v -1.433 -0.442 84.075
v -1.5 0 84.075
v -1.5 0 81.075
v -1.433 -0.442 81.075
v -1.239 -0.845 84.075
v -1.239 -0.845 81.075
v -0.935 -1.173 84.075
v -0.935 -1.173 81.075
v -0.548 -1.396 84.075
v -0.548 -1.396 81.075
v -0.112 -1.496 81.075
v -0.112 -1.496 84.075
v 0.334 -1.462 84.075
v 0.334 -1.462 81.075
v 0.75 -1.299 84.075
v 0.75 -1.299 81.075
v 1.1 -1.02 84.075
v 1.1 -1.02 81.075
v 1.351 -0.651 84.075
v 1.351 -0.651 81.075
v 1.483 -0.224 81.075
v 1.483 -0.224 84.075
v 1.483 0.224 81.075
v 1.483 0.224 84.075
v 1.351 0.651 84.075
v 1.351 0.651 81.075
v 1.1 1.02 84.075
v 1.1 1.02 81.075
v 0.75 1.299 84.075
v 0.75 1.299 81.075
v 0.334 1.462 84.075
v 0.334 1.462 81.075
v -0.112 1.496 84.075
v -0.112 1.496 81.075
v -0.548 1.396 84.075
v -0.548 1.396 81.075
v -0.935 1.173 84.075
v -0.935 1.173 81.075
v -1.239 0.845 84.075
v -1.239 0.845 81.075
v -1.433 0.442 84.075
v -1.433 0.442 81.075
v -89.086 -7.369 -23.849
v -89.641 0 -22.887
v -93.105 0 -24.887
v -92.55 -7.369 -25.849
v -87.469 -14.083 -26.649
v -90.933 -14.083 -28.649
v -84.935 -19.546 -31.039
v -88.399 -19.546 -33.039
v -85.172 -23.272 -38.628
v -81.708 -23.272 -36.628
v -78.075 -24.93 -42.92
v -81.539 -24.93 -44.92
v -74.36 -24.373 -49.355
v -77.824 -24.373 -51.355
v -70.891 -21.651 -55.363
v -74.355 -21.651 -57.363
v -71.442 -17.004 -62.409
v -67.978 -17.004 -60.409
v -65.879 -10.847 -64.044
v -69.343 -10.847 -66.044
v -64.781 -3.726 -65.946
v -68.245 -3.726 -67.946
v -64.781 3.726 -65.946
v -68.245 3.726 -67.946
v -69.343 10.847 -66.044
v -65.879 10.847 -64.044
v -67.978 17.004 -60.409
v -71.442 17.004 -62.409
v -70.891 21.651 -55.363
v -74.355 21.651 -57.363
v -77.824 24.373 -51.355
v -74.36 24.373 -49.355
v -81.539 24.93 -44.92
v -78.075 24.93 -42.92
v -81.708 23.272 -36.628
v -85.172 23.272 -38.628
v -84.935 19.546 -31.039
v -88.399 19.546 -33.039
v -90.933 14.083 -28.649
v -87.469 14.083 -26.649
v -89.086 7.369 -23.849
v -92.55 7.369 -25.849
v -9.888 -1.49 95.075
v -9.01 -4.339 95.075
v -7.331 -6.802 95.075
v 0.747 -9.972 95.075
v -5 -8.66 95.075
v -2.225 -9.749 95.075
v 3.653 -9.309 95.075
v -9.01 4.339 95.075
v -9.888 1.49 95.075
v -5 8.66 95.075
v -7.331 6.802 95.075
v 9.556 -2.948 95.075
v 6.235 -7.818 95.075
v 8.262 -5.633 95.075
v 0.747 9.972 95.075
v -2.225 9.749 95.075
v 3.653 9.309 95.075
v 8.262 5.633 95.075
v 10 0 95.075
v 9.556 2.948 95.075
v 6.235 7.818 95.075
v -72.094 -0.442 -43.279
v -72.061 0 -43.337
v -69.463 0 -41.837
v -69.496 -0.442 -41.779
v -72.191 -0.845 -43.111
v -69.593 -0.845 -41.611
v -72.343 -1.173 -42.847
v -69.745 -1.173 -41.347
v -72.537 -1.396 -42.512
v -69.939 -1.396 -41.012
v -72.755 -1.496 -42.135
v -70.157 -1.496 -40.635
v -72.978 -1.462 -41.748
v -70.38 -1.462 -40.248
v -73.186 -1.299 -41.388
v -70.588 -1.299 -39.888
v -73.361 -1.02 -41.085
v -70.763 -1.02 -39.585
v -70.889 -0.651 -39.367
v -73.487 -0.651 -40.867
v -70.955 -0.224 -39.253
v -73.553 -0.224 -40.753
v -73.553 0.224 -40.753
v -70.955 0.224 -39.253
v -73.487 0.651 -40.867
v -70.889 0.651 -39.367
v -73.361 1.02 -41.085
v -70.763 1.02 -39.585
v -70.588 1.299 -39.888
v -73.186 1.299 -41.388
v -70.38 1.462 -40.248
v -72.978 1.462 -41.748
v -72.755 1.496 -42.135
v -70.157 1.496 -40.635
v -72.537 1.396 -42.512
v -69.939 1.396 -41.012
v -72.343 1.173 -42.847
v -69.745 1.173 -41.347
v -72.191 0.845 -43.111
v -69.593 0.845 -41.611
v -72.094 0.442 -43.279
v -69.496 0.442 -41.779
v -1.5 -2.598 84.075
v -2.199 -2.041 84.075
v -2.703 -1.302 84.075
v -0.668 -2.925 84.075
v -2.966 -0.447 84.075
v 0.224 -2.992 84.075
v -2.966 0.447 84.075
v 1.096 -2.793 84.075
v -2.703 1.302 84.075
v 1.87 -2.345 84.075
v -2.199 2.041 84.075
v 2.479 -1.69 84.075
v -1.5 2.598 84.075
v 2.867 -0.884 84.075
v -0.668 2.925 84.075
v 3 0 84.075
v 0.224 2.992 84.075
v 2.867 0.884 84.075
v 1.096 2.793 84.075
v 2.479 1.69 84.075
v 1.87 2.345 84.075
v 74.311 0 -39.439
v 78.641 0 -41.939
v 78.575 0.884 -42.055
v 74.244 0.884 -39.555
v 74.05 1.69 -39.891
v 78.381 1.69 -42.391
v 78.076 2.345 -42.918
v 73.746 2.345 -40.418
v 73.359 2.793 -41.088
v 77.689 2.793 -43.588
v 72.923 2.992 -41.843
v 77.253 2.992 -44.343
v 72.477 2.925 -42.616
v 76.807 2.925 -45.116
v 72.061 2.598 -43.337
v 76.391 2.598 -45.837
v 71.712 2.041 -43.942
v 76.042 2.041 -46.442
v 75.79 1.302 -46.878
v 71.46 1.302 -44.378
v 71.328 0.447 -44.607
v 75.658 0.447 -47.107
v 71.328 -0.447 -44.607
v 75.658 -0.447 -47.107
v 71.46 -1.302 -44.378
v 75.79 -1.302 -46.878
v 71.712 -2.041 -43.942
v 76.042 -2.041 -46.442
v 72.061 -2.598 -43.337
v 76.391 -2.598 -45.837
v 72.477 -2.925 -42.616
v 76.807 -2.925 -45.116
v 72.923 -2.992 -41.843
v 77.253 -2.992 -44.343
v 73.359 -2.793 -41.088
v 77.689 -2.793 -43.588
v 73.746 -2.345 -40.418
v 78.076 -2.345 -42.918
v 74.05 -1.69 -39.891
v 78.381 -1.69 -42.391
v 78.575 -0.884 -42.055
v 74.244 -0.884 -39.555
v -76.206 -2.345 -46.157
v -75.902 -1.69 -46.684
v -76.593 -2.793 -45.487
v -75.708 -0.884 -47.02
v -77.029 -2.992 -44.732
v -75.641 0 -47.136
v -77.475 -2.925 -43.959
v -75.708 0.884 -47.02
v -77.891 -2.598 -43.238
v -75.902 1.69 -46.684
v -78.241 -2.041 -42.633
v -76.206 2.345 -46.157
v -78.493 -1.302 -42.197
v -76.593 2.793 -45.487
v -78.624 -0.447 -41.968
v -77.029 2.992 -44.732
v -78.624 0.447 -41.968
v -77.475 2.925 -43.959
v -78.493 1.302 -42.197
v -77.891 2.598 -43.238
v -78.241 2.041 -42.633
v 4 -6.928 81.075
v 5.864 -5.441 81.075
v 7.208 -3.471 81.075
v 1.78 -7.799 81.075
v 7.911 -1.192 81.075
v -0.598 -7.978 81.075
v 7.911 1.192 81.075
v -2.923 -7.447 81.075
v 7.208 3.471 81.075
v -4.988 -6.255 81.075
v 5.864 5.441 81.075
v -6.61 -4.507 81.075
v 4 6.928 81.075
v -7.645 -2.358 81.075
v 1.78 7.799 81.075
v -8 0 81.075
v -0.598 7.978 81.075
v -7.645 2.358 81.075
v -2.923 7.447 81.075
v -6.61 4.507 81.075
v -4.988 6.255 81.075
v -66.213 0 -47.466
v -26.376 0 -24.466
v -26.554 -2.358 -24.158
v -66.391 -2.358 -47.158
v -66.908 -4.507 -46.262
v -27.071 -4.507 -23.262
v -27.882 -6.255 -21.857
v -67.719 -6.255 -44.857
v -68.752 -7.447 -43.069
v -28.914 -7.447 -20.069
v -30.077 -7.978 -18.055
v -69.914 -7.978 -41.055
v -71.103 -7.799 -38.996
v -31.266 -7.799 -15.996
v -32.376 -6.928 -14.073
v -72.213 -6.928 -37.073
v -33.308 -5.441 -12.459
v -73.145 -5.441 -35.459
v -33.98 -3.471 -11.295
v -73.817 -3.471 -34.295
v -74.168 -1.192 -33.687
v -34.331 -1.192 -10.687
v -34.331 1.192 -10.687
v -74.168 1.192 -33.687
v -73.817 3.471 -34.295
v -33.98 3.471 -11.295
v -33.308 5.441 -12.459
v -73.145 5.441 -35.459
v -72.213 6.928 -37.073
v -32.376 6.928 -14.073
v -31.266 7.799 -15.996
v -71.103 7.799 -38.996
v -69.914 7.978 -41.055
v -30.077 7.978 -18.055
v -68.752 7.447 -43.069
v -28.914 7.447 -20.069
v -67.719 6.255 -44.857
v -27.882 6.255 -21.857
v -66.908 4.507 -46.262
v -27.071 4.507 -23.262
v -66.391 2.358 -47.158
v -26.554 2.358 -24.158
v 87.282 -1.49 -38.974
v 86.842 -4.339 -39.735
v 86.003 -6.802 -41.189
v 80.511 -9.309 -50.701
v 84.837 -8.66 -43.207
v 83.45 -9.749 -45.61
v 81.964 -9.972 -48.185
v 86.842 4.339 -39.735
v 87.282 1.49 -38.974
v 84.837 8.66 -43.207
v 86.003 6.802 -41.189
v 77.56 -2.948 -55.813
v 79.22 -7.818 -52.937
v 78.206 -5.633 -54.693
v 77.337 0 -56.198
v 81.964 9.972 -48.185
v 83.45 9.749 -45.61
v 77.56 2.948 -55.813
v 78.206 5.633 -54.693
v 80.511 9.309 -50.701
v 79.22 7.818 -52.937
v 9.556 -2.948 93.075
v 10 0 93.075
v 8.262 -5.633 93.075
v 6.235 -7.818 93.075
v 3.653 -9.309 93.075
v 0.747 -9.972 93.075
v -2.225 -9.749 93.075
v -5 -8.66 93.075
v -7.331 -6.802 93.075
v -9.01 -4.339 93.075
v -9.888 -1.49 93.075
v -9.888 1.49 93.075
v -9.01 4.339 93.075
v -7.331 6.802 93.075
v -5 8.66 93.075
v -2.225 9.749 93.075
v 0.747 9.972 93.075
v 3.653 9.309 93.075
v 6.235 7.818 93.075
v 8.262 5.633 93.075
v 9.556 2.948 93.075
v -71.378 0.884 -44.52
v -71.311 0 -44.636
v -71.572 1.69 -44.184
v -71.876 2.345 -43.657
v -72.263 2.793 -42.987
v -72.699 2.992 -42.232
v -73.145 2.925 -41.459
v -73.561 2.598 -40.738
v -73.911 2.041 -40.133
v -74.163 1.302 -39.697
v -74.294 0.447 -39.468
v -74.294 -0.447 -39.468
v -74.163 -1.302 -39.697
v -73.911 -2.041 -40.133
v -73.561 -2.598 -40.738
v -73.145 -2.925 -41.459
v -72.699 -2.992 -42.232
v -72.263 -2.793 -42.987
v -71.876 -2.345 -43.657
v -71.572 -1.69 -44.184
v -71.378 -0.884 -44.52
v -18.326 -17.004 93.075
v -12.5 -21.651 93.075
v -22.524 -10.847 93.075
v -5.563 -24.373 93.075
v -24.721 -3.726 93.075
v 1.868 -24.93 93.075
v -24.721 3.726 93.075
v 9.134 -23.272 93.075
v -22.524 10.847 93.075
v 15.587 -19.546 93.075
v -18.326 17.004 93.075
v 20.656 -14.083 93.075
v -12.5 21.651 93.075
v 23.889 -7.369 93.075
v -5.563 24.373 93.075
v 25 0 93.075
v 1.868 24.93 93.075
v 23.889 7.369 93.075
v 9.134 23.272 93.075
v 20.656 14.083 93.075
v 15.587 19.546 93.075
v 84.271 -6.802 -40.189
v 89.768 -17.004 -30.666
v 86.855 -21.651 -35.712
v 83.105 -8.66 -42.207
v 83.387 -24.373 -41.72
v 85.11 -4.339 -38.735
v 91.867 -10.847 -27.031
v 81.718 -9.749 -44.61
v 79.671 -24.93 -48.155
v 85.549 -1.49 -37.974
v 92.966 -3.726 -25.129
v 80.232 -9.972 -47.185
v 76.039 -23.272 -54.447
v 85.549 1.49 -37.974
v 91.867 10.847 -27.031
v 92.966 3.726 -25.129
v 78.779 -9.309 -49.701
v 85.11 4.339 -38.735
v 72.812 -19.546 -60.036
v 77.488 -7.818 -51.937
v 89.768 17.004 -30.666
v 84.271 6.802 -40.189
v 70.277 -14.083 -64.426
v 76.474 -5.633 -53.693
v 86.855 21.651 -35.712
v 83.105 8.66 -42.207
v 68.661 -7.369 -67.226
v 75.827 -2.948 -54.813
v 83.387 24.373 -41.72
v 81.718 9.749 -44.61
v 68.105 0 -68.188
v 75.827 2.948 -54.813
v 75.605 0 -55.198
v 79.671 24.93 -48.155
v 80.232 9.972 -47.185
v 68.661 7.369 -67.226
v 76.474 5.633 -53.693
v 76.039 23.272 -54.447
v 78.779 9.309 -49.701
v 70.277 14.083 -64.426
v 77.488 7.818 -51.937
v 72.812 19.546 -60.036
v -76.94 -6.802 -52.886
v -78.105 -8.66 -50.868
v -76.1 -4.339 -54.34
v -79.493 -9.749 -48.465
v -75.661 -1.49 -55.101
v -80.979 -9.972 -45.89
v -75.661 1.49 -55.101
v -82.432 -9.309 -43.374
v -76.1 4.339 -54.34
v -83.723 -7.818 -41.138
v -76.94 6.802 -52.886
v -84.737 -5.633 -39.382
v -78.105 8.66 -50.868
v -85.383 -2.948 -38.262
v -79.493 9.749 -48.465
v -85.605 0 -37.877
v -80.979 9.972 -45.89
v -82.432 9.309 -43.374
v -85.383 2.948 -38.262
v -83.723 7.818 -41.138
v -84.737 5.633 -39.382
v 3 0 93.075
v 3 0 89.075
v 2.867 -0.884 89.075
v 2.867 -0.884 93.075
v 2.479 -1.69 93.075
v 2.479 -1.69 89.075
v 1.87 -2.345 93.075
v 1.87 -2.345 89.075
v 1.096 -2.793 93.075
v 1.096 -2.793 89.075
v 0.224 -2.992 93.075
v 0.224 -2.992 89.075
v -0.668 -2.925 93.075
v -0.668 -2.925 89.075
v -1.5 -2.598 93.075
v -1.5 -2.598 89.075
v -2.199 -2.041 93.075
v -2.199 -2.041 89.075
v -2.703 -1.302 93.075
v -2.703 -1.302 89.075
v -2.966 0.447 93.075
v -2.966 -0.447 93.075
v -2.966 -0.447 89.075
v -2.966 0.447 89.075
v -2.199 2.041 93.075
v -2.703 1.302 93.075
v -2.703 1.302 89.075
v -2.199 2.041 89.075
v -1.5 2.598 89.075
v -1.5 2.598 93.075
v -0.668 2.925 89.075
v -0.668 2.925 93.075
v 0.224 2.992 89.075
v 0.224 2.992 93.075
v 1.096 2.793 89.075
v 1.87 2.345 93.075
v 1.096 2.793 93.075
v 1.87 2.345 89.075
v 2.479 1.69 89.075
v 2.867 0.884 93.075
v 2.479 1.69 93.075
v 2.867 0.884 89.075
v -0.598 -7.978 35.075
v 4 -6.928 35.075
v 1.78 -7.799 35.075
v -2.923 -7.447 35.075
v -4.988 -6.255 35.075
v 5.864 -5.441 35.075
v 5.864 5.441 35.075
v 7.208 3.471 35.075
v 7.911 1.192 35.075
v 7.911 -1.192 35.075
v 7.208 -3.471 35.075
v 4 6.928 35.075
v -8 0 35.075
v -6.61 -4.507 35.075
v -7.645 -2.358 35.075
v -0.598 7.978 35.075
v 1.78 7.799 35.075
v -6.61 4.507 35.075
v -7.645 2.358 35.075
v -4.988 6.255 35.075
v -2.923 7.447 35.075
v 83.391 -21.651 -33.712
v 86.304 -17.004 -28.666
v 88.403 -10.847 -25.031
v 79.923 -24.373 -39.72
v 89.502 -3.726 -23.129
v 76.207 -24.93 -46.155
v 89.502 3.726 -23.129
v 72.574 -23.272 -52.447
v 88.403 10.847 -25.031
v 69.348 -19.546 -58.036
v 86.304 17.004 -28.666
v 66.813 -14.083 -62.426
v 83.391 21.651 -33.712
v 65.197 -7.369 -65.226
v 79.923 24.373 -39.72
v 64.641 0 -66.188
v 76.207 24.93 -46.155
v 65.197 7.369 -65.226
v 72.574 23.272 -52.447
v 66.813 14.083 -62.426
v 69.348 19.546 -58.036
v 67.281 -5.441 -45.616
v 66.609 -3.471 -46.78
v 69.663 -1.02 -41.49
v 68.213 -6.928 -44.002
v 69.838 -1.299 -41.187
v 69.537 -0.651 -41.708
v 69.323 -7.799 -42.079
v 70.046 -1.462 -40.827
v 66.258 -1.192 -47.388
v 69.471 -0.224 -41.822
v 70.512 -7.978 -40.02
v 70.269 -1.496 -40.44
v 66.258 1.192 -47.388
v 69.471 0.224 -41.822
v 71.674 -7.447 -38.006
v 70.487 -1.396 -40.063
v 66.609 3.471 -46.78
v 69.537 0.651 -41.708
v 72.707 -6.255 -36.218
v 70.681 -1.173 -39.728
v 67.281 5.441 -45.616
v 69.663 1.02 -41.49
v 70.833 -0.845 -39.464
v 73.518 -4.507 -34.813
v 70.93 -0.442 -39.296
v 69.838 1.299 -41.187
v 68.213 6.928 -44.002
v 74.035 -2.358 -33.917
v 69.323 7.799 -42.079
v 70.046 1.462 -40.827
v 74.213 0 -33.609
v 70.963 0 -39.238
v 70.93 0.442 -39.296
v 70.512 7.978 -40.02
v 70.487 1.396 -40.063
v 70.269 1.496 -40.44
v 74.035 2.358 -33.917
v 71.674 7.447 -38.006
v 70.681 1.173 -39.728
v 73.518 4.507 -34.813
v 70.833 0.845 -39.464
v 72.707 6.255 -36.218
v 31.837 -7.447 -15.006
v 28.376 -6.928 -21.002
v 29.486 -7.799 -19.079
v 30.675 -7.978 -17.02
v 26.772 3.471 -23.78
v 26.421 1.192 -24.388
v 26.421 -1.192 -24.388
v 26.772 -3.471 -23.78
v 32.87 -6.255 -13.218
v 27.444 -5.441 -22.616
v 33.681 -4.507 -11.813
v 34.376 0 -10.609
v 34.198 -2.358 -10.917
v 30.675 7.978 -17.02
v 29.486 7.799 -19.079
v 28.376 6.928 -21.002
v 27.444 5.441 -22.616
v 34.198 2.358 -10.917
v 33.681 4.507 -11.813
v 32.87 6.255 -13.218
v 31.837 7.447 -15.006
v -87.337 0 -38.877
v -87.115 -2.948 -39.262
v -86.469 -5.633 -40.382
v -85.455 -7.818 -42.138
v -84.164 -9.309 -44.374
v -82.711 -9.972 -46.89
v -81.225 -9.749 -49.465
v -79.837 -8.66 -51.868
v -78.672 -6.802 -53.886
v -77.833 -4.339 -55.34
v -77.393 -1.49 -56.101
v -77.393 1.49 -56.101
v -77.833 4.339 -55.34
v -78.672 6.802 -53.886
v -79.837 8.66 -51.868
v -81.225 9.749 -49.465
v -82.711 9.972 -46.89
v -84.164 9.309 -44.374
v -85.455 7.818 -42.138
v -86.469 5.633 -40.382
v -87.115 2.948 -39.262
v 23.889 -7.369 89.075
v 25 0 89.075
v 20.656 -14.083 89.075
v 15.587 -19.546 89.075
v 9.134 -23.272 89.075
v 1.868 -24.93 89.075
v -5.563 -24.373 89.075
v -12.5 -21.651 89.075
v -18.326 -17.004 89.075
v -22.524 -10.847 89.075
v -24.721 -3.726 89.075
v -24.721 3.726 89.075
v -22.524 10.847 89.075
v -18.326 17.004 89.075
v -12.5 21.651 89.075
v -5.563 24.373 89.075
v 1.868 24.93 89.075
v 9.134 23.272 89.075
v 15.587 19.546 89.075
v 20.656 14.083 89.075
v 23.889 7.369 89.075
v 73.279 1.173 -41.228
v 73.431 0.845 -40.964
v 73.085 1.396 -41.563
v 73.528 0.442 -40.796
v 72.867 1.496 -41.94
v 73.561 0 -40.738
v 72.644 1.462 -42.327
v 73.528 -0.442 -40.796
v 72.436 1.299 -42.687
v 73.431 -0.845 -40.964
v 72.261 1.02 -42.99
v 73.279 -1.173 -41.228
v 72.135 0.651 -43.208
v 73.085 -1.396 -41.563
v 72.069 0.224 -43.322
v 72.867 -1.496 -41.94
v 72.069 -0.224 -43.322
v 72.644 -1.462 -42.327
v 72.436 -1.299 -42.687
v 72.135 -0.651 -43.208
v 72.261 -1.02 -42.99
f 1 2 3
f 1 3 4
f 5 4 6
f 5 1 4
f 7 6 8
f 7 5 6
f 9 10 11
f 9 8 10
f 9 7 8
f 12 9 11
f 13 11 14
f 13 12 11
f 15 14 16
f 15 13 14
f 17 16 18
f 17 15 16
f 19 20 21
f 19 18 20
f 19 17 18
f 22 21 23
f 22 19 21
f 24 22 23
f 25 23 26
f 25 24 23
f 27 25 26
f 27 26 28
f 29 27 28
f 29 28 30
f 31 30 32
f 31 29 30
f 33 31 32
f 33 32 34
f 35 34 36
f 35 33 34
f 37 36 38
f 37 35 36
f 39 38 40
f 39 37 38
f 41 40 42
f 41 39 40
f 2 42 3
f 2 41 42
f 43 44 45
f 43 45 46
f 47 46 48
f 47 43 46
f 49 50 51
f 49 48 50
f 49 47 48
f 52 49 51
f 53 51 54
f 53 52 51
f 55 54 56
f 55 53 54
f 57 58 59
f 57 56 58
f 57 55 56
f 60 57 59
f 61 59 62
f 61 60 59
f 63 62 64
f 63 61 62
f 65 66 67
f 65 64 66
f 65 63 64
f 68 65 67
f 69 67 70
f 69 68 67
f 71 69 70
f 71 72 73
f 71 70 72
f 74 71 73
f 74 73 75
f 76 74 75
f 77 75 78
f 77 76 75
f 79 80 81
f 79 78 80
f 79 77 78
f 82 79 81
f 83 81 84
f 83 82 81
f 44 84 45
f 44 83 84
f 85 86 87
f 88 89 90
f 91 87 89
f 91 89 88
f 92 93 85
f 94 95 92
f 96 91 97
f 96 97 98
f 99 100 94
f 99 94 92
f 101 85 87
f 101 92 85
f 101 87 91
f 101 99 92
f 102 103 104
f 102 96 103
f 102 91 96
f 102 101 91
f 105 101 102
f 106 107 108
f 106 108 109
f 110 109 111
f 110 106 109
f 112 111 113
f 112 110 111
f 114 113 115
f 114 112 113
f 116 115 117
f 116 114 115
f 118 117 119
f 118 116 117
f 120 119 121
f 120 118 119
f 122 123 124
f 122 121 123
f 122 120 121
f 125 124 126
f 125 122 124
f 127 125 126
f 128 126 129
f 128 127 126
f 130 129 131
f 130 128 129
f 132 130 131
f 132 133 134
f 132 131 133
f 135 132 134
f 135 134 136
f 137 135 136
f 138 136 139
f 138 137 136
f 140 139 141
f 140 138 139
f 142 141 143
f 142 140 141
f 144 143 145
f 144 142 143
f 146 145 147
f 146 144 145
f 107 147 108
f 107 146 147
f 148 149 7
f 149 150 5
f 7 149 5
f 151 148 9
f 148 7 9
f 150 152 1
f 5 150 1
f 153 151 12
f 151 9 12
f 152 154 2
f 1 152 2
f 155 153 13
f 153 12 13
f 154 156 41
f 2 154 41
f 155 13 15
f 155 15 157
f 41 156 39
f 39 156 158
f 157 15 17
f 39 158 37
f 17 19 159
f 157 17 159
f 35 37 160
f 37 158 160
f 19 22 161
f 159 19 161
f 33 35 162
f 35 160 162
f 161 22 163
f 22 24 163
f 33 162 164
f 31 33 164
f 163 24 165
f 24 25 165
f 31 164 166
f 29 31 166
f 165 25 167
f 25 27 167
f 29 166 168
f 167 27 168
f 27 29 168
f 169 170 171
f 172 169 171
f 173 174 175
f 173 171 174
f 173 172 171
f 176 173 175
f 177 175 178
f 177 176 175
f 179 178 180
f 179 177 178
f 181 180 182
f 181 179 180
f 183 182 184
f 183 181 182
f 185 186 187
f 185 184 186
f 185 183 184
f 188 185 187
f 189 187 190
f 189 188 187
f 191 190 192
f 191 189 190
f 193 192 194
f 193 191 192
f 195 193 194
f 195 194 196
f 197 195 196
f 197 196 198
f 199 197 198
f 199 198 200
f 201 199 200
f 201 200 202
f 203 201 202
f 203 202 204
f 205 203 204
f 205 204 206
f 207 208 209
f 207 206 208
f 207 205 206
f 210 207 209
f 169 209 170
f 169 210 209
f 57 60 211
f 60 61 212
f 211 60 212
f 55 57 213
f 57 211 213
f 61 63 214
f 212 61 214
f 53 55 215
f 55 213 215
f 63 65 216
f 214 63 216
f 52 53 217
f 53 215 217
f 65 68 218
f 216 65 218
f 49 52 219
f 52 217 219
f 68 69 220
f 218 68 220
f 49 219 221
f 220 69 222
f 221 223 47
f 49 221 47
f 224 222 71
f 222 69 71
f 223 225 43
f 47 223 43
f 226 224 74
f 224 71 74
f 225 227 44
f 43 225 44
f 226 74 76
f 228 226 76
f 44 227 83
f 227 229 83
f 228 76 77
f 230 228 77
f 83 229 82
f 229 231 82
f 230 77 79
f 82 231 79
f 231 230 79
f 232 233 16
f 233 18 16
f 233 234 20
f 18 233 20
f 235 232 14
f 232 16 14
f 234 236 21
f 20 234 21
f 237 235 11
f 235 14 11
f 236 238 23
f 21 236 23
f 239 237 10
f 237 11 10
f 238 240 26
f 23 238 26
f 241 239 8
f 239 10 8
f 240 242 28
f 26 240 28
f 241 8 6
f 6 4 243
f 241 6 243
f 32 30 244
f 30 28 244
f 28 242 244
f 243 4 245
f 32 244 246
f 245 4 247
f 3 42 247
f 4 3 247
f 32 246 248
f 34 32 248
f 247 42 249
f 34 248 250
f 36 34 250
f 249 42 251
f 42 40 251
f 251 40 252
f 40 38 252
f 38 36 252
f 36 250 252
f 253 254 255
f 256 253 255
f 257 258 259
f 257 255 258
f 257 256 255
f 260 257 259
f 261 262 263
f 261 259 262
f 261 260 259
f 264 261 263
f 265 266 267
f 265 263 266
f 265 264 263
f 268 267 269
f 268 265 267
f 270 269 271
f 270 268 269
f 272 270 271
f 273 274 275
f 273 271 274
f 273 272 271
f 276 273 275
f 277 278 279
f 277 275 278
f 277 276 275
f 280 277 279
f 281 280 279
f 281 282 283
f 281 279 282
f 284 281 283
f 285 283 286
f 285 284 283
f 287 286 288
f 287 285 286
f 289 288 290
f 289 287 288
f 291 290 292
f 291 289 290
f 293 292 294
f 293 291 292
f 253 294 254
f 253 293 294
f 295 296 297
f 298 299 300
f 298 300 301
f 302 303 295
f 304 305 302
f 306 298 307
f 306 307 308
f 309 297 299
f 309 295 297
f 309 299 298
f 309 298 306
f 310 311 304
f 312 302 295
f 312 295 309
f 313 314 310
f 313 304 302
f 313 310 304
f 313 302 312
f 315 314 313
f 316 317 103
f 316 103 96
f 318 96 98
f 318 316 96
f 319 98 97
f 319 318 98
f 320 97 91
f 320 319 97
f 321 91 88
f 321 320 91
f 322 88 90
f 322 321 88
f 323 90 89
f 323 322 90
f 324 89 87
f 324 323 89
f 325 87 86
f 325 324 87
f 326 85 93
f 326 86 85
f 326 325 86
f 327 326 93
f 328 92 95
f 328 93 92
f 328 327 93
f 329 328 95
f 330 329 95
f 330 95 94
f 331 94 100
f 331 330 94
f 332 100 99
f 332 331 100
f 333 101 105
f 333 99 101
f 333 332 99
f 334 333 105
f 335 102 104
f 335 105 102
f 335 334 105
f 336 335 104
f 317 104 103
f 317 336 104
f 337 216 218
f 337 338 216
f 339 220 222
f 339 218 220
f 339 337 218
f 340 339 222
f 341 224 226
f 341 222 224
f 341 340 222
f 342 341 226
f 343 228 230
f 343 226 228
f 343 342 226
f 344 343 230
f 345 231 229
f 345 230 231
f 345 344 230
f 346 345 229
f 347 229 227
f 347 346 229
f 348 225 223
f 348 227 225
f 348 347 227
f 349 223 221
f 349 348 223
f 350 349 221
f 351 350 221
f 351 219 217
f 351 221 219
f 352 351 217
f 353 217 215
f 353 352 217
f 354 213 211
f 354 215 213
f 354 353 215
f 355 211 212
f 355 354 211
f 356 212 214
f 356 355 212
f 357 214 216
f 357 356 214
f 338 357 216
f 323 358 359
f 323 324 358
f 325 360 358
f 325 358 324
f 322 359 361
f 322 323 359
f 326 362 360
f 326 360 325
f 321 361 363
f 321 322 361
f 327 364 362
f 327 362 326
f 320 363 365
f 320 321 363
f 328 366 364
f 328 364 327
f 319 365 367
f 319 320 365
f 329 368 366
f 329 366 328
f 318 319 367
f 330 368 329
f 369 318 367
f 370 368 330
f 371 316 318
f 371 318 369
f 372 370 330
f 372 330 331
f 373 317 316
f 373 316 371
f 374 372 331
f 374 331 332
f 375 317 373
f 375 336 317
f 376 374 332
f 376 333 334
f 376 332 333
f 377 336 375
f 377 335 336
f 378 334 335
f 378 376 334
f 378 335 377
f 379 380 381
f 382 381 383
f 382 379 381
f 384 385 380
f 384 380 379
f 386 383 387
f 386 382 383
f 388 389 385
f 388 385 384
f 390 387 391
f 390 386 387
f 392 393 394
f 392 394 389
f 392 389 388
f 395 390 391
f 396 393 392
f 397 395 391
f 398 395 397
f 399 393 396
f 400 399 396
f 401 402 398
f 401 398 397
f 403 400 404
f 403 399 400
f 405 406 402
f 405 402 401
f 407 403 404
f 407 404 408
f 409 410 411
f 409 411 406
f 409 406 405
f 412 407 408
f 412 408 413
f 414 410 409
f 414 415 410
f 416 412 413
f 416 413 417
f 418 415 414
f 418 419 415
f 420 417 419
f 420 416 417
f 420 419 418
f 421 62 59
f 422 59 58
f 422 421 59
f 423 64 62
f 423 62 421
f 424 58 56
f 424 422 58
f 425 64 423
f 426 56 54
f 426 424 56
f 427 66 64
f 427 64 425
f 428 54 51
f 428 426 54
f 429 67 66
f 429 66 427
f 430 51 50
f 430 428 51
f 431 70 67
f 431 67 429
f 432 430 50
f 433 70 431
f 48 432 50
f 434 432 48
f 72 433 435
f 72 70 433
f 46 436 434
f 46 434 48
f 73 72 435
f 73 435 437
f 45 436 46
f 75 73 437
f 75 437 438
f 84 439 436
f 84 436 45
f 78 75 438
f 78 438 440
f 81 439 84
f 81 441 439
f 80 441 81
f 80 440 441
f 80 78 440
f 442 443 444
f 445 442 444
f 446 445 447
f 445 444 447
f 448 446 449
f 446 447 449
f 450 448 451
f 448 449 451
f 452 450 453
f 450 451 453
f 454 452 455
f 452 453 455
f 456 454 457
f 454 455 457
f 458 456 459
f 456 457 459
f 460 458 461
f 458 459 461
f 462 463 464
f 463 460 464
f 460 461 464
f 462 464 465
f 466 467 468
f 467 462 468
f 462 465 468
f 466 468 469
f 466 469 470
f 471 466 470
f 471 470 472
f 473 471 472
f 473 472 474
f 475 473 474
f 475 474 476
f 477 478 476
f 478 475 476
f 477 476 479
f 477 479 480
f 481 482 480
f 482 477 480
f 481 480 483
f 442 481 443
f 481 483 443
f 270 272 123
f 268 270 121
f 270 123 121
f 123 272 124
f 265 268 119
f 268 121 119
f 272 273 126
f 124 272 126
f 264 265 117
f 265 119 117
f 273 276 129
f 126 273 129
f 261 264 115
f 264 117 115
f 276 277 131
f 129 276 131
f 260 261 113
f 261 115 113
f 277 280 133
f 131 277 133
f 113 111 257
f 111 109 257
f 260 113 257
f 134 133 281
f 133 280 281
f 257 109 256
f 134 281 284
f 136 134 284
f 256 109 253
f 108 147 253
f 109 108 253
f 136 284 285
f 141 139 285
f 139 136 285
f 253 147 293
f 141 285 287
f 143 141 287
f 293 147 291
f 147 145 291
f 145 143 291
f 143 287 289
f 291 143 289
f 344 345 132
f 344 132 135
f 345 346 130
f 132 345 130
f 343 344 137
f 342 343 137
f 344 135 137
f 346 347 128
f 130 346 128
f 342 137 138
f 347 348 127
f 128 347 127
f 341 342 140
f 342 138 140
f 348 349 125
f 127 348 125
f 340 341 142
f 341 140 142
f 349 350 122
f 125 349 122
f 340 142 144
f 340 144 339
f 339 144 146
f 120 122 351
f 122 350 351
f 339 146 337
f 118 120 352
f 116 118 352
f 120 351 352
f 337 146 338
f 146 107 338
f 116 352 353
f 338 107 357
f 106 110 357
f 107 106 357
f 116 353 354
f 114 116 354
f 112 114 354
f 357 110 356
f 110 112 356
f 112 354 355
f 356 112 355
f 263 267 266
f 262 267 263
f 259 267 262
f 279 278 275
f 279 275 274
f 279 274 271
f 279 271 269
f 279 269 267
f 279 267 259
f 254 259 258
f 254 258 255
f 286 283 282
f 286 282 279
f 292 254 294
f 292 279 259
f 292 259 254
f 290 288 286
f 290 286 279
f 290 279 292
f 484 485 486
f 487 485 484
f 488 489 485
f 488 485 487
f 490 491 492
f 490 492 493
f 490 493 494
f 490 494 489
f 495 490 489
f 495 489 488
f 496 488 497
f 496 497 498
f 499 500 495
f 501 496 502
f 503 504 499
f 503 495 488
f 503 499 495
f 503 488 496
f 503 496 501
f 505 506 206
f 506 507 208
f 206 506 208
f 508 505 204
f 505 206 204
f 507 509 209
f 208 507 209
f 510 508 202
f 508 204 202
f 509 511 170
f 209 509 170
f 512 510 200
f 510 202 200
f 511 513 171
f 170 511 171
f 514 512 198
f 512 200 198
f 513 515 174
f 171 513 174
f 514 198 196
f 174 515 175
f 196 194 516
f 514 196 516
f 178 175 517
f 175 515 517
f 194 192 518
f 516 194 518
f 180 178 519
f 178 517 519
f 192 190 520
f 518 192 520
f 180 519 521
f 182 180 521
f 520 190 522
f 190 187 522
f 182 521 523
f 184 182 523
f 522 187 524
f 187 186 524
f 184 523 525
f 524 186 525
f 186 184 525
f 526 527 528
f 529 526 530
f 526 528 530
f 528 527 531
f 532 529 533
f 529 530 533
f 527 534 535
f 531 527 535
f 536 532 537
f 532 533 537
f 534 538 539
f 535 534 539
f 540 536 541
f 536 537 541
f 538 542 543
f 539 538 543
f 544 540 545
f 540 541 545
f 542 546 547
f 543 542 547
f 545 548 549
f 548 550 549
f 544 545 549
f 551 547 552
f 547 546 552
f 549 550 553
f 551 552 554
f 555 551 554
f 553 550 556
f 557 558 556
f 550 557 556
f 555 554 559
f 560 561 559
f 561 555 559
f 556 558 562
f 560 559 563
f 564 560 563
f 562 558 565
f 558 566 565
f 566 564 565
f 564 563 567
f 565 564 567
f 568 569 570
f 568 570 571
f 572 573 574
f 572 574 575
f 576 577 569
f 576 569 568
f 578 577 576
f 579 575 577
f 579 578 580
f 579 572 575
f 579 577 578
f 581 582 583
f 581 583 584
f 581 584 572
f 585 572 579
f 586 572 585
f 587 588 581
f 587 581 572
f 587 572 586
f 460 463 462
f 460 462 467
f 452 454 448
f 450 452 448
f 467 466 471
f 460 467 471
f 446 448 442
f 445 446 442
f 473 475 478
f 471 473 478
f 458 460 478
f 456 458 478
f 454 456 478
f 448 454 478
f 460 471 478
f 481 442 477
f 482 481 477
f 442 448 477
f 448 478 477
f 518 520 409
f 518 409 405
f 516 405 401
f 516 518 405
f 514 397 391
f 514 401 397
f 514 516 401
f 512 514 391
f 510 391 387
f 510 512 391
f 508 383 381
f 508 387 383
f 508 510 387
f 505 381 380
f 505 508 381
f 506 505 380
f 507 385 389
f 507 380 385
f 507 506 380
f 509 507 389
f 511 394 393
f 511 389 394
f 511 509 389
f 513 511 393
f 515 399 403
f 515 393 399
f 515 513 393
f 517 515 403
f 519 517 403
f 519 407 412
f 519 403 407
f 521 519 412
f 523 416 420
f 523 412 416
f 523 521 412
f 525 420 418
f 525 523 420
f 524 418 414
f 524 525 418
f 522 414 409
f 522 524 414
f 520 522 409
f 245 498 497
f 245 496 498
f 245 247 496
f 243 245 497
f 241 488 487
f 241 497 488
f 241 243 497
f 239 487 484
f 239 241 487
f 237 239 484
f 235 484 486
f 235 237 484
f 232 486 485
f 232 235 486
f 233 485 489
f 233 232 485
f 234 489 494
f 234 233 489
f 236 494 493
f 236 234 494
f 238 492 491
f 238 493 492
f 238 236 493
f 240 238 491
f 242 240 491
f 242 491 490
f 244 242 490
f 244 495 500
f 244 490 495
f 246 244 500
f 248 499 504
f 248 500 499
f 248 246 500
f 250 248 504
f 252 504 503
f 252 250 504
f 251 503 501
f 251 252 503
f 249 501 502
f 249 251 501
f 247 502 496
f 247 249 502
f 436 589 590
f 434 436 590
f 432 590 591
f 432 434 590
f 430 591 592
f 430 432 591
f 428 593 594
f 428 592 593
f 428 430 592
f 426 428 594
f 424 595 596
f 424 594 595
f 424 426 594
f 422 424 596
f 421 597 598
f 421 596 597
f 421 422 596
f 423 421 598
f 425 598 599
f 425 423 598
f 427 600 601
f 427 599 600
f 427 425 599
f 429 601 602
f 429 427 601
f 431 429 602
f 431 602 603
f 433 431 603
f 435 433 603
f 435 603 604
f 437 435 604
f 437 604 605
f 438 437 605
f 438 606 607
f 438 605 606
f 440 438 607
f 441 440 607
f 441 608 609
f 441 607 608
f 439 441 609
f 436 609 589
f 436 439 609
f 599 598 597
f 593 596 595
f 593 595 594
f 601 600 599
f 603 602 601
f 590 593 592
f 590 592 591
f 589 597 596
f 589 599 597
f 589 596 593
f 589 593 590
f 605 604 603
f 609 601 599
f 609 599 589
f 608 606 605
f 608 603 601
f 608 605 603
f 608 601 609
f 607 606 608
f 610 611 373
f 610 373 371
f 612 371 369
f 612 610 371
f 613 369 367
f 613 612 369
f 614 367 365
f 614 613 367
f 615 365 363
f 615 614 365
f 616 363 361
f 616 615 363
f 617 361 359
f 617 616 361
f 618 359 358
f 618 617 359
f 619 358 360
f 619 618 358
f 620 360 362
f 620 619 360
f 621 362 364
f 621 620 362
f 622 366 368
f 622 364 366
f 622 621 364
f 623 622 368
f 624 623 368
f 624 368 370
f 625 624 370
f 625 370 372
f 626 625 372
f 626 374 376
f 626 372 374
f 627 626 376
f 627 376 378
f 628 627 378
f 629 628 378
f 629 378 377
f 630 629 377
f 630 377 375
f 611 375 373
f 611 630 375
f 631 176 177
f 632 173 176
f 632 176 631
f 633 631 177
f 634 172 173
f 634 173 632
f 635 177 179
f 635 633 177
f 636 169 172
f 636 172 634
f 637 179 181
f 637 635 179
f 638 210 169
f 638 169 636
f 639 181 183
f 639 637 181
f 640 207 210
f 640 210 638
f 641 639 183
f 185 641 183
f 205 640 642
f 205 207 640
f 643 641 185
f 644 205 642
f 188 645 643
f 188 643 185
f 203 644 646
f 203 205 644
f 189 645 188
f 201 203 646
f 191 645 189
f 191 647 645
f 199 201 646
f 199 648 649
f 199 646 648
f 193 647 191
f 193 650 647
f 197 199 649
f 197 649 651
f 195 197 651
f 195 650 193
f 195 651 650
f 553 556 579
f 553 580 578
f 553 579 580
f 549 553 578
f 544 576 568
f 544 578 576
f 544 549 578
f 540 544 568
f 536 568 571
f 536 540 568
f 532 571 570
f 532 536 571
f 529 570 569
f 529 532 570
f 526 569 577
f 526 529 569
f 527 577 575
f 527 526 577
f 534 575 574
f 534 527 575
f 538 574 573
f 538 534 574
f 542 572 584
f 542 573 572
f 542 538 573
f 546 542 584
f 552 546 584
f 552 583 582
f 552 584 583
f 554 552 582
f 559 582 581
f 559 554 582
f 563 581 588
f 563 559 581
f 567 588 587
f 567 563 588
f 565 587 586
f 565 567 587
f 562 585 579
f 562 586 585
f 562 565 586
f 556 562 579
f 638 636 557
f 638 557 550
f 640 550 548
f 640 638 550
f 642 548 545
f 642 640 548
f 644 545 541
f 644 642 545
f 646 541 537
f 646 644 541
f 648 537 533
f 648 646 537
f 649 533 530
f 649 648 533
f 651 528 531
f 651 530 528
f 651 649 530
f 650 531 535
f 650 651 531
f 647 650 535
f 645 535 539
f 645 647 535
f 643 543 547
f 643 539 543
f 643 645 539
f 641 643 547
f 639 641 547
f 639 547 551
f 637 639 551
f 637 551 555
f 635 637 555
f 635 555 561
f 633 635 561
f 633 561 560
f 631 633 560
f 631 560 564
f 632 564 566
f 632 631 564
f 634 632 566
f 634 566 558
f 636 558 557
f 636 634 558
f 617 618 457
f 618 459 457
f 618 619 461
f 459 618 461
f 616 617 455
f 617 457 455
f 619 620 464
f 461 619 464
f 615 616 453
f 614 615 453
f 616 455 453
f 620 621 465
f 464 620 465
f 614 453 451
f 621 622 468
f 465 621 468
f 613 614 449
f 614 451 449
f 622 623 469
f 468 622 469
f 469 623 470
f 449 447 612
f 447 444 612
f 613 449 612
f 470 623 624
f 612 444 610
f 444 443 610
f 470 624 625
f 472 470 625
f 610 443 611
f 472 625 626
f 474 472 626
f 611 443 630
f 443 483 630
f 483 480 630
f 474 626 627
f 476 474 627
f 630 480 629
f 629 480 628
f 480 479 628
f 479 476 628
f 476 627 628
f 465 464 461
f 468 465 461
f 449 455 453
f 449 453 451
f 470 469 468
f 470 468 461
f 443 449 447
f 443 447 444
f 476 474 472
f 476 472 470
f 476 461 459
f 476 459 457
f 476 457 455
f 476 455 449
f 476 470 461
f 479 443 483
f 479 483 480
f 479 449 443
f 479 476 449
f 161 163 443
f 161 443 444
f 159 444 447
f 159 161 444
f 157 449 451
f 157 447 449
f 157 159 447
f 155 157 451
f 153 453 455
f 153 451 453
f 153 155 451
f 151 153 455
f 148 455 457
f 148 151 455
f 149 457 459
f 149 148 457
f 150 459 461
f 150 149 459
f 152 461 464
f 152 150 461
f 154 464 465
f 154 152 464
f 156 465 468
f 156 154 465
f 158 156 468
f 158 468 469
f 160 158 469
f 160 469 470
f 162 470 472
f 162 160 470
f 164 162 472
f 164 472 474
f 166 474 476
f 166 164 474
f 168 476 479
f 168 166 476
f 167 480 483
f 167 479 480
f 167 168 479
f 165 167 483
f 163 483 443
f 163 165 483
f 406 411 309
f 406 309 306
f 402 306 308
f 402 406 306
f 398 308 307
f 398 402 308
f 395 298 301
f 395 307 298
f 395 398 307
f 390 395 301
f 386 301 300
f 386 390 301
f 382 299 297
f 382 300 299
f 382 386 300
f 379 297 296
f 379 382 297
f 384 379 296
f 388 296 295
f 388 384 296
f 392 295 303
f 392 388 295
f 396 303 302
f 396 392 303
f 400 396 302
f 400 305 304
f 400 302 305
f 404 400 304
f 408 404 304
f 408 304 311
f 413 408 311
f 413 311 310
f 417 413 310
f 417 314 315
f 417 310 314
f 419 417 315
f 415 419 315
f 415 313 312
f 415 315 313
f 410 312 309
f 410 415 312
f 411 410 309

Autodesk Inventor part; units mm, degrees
ref_plane "YZ Plane" through (0, 0, 0) normal (1, 0, 0) x (0, 1, 0)
ref_plane "XZ Plane" through (0, 0, 0) normal (0, 1, 0) x (-1, 0, 0)
ref_plane "XY Plane" through (0, 0, 0) normal (0, 0, 1) x (1, 0, 0)
sketch "Sketch1" plane through (0, 0, 0) normal (0, 1, 0) x (-1, 0, 0)
  line L0 (0, 0) -> (72.811086, -42.0375)
  line L1 (0, 0) -> (84.075, 0) construction
  line L2 (0, 0) -> (-72.811086, -42.0375)
  line L3 (0, 0) -> (84.075, 0) construction
  line L4 (0, 0) -> (0, 84.075)
  line L5 (72.811086, -42.0375) -> (77.141213, -44.5375)
  line L6 (77.141213, -44.5375) -> (75.641213, -47.135576)
  line L7 (75.641213, -47.135576) -> (71.311086, -44.635576)
  line L8 (71.311086, -44.635576) -> (72.811086, -42.0375)
  line L9 (-72.811086, -42.0375) -> (-77.141213, -44.5375)
  line L10 (-77.141213, -44.5375) -> (-78.641213, -41.939424)
  line L11 (-78.641213, -41.939424) -> (-74.311086, -39.439424)
  line L12 (-74.311086, -39.439424) -> (-72.811086, -42.0375)
  line L13 (0, 84.075) -> (0, 89.075)
  line L14 (0, 89.075) -> (-3, 89.075)
  line L15 (-3, 89.075) -> (-3, 84.075)
  line L16 (-3, 84.075) -> (0, 84.075)
  dimension "d0" = 84.075
  dimension "d1" = 30
  dimension "d2" = 84.075
  dimension "d3" = 150
  dimension "d4" = 84.075
  dimension "d5" = 5
  dimension "d6" = 3
  dimension "d7" = 3
  dimension "d8" = 5
  dimension "d9" = 3
revolve "Revolution1" add sketch "Sketch1" angle 360 about axis through (-72.811086, 0, -42.0375) along (-0.8660254, 0, -0.5) contours L5 L6 L7 L8
revolve "Revolution2" add sketch "Sketch1" angle 360 about axis through (0, 0, 84.075) along (0, 0, 1) contours L16 L15 L14 L13
revolve "Revolution3" add sketch "Sketch1" angle 360 about axis through (72.811086, 0, -42.0375) along (0.8660254, 0, -0.5) contours L9 L10 L11 L12
sketch "Sketch2" plane through (0, 0, 89.075) normal (0, 0, 1) x (1, 0, 0)
  circle A0 centre (0, 0) radius 3 projected
  circle A1 centre (0, 0) radius 25
  dimension "d13" = 50
extrude "Extrusion1" add sketch "Sketch2" along normal blind 4
sketch "Sketch3" plane through (0, 0, 93.075) normal (0, 0, 1) x (1, 0, 0)
  circle A0 centre (0, 0) radius 10
  dimension "d16" = 20
extrude "Extrusion2" add sketch "Sketch3" along normal blind 2
sketch "Sketch4" plane through (-77.141213, 0, -44.5375) normal (-0.8660254, 0, -0.5) x (-0.5, 0, 0.8660254)
  circle A0 centre (0, 0) radius 25
  dimension "d19" = 50
extrude "Extrusion3" add sketch "Sketch4" along normal blind 4
sketch "Sketch5" plane through (-80.605314, 0, -46.5375) normal (-0.8660254, 0, -0.5) x (-0.5, 0, 0.8660254)
  circle A0 centre (0, 0) radius 10
  dimension "d22" = 20
extrude "Extrusion4" add sketch "Sketch5" along normal blind 2
sketch "Sketch6" plane through (77.141213, 0, -44.5375) normal (0.8660254, 0, -0.5) x (-0.5, 0, -0.8660254)
  circle A0 centre (0, 0) radius 25
  dimension "d25" = 50
extrude "Extrusion5" add sketch "Sketch6" along normal blind 4
sketch "Sketch7" plane through (80.605314, 0, -46.5375) normal (0.8660254, 0, -0.5) x (-0.5, 0, -0.8660254)
  circle A0 centre (0, 0) radius 10
  dimension "d28" = 20
extrude "Extrusion6" add sketch "Sketch7" along normal blind 2
sketch "Sketch8" plane through (0, 0, 84.075) normal (0, 0, -1) x (-1, 0, 0)
  circle A0 centre (0, 0) radius 1.5
  dimension "d31" = 3
extrude "Extrusion7" add sketch "Sketch8" along normal blind 3
sketch "Sketch9" plane through (0, 0, 81.075) normal (0, 0, -1) x (-1, 0, 0)
  circle A0 centre (0, 0) radius 8
  dimension "d34" = 16
extrude "Extrusion8" add sketch "Sketch9" along normal blind 46
sketch "Sketch10" plane through (-72.811086, 0, -42.0375) normal (0.8660254, 0, 0.5) x (0.5, 0, -0.8660254)
  circle A0 centre (0, 0) radius 1.5
  dimension "d37" = 3
extrude "Extrusion9" add sketch "Sketch10" along normal blind 3
sketch "Sketch11" plane through (-70.21301, 0, -40.5375) normal (0.8660254, 0, 0.5) x (0.5, 0, -0.8660254)
  circle A0 centre (0, 0) radius 8
  dimension "d40" = 16
extrude "Extrusion10" add sketch "Sketch11" along normal blind 46
sketch "Sketch12" plane through (72.811086, 0, -42.0375) normal (-0.8660254, 0, 0.5) x (0.5, 0, 0.8660254)
  circle A0 centre (0, 0) radius 1.5
  dimension "d43" = 3
extrude "Extrusion11" add sketch "Sketch12" along normal blind 3
sketch "Sketch13" plane through (70.21301, 0, -40.5375) normal (-0.8660254, 0, 0.5) x (0.5, 0, 0.8660254)
  circle A0 centre (0, 0) radius 8
  dimension "d46" = 16
extrude "Extrusion12" add sketch "Sketch13" along normal blind 46
properties part number "Motors and Wheels"
